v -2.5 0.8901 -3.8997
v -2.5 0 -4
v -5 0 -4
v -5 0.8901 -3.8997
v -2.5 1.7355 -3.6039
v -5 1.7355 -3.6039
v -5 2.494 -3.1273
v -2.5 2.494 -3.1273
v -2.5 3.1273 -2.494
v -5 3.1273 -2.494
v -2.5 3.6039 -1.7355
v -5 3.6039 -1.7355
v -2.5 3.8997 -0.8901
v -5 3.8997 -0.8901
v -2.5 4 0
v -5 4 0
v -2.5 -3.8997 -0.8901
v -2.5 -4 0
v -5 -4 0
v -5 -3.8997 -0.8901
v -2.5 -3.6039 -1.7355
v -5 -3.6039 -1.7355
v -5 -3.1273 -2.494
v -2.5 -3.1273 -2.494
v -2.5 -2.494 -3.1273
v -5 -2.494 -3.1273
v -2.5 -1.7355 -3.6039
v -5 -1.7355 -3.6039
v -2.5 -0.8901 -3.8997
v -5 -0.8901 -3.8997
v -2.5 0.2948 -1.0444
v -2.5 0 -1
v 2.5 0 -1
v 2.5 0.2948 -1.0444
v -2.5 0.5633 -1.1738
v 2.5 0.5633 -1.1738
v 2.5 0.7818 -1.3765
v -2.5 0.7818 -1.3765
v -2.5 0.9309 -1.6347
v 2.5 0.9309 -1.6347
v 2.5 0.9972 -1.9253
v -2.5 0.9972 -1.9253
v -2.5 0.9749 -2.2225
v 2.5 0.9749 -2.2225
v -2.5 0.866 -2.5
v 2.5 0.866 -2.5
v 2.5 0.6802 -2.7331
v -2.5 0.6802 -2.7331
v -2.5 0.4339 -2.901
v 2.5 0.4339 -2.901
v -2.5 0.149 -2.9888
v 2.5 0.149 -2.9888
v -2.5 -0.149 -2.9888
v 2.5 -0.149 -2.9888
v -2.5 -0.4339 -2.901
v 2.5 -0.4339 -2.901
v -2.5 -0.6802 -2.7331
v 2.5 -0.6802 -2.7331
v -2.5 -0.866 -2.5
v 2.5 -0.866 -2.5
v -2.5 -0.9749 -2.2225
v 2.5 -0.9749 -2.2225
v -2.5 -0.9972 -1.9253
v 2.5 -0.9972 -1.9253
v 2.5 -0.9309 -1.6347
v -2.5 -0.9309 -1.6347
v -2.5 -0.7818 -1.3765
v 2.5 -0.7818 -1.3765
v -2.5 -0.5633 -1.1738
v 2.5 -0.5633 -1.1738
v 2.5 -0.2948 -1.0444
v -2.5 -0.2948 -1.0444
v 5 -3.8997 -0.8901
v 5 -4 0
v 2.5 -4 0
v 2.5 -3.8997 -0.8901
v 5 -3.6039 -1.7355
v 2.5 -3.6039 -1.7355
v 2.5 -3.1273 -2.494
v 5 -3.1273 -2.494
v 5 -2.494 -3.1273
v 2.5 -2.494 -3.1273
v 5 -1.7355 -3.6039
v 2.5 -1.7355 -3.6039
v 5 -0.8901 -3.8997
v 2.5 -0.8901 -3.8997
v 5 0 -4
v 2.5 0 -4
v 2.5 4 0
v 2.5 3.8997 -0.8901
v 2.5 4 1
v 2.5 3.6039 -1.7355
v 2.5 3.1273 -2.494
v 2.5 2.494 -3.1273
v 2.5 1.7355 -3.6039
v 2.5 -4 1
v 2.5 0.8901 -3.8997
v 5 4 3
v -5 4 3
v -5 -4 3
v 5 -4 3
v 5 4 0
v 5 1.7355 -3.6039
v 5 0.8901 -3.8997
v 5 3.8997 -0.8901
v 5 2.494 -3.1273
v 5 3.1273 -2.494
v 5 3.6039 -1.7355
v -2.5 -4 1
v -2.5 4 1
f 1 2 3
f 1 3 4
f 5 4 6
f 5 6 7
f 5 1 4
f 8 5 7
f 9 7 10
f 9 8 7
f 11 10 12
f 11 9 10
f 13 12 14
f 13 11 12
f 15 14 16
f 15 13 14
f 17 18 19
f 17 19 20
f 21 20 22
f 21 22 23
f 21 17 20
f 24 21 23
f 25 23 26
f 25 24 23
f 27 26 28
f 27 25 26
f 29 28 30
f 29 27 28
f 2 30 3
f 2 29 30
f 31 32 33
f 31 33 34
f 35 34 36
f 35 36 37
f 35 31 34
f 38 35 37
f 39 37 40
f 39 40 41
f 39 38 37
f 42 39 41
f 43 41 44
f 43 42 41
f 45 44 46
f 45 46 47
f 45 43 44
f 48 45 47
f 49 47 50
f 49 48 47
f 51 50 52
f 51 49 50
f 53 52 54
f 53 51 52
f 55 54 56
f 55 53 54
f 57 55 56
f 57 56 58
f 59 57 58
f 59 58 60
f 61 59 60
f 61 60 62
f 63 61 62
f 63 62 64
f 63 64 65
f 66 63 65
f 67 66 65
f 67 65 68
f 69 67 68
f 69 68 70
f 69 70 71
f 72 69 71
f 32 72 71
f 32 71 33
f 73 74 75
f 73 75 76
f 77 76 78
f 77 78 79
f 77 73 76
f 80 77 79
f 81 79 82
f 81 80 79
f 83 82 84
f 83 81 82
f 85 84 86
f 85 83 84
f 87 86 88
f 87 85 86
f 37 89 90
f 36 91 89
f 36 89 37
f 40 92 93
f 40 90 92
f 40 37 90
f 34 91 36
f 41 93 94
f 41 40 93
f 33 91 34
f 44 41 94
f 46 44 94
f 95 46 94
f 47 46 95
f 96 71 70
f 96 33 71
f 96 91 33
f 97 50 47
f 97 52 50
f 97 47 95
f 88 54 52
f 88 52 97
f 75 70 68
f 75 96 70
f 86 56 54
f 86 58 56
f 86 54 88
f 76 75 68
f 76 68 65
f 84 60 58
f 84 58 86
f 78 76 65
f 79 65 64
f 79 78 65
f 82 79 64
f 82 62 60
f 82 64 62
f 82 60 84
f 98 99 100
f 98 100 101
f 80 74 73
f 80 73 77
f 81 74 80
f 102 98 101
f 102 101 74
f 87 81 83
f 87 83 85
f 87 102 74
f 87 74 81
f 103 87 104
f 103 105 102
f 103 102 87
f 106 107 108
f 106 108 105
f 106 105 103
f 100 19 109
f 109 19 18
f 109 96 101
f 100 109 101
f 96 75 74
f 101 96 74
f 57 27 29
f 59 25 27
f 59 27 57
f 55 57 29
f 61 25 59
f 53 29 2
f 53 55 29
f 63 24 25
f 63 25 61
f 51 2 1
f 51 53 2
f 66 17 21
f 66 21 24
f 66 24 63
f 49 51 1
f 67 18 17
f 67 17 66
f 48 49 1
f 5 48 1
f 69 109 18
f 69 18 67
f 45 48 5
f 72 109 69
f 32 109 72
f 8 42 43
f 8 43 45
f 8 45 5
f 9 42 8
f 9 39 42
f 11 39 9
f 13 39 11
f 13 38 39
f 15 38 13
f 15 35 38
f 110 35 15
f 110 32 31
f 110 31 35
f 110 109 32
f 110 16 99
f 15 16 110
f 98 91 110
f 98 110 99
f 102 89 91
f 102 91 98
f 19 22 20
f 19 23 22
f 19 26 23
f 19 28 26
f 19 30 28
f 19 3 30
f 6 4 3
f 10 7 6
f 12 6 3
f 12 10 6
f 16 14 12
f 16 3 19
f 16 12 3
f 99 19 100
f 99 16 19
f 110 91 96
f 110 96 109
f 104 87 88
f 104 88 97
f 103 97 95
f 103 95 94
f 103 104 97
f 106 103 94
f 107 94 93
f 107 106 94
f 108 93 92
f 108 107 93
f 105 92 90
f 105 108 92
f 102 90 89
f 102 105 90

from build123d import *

# Parameters (mm, degrees)
SKETCH_1_W          = 10
SKETCH_1_H          = 8
EXTRUDE_1_DEPTH     = 3
EXTRUDE_2_DEPTH     = 10
SKETCH_4_W          = 5
SKETCH_4_H          = 8
CUT_EXTRUDE_1_DEPTH = 10
SKETCH_5_R          = 1
EXTRUDE_3_DEPTH     = 10
SKETCH_7_W          = 5
SKETCH_7_H          = 1
CUT_EXTRUDE_2_DEPTH = 10


with BuildPart() as part:
    # 草图1 → 凸台-拉伸1 (new body)
    with BuildSketch(Plane.XY):
        Rectangle(SKETCH_1_W, SKETCH_1_H)
    extrude(amount=EXTRUDE_1_DEPTH)

    # 草图3 → 凸台-拉伸2 (add)
    with BuildSketch(Plane(origin=(5, 0, 0), x_dir=(0, 0, -1), z_dir=(1, 0, 0))):
        with BuildLine():
            ThreePointArc((4, 0), (2.828427125, 2.828427125), (0, 4))
            Line((0, 4), (0, -4))
            ThreePointArc((0, -4), (2.828427125, -2.828427125), (4, 0))
        make_face()
    extrude(amount=-EXTRUDE_2_DEPTH)

    # 草图4 → 切除-拉伸1 (cut)
    with BuildSketch(Plane.XY):
        Rectangle(SKETCH_4_W, SKETCH_4_H)
    extrude(amount=-CUT_EXTRUDE_1_DEPTH, mode=Mode.SUBTRACT)

    # 草图5 → 凸台-拉伸3 (add)
    with BuildSketch(Plane.ZY.offset(5)):
        with Locations((-2, 0)):
            Circle(SKETCH_5_R)
    extrude(amount=-EXTRUDE_3_DEPTH)

    # 草图7 → 切除-拉伸2 (cut)
    with BuildSketch(Plane(origin=(0, -4, 0), x_dir=(-1, 0, 0), z_dir=(0, -1, 0))):
        with Locations((0, -0.5)):
            Rectangle(SKETCH_7_W, SKETCH_7_H)
    extrude(amount=-CUT_EXTRUDE_2_DEPTH, mode=Mode.SUBTRACT)


solid = part.part
